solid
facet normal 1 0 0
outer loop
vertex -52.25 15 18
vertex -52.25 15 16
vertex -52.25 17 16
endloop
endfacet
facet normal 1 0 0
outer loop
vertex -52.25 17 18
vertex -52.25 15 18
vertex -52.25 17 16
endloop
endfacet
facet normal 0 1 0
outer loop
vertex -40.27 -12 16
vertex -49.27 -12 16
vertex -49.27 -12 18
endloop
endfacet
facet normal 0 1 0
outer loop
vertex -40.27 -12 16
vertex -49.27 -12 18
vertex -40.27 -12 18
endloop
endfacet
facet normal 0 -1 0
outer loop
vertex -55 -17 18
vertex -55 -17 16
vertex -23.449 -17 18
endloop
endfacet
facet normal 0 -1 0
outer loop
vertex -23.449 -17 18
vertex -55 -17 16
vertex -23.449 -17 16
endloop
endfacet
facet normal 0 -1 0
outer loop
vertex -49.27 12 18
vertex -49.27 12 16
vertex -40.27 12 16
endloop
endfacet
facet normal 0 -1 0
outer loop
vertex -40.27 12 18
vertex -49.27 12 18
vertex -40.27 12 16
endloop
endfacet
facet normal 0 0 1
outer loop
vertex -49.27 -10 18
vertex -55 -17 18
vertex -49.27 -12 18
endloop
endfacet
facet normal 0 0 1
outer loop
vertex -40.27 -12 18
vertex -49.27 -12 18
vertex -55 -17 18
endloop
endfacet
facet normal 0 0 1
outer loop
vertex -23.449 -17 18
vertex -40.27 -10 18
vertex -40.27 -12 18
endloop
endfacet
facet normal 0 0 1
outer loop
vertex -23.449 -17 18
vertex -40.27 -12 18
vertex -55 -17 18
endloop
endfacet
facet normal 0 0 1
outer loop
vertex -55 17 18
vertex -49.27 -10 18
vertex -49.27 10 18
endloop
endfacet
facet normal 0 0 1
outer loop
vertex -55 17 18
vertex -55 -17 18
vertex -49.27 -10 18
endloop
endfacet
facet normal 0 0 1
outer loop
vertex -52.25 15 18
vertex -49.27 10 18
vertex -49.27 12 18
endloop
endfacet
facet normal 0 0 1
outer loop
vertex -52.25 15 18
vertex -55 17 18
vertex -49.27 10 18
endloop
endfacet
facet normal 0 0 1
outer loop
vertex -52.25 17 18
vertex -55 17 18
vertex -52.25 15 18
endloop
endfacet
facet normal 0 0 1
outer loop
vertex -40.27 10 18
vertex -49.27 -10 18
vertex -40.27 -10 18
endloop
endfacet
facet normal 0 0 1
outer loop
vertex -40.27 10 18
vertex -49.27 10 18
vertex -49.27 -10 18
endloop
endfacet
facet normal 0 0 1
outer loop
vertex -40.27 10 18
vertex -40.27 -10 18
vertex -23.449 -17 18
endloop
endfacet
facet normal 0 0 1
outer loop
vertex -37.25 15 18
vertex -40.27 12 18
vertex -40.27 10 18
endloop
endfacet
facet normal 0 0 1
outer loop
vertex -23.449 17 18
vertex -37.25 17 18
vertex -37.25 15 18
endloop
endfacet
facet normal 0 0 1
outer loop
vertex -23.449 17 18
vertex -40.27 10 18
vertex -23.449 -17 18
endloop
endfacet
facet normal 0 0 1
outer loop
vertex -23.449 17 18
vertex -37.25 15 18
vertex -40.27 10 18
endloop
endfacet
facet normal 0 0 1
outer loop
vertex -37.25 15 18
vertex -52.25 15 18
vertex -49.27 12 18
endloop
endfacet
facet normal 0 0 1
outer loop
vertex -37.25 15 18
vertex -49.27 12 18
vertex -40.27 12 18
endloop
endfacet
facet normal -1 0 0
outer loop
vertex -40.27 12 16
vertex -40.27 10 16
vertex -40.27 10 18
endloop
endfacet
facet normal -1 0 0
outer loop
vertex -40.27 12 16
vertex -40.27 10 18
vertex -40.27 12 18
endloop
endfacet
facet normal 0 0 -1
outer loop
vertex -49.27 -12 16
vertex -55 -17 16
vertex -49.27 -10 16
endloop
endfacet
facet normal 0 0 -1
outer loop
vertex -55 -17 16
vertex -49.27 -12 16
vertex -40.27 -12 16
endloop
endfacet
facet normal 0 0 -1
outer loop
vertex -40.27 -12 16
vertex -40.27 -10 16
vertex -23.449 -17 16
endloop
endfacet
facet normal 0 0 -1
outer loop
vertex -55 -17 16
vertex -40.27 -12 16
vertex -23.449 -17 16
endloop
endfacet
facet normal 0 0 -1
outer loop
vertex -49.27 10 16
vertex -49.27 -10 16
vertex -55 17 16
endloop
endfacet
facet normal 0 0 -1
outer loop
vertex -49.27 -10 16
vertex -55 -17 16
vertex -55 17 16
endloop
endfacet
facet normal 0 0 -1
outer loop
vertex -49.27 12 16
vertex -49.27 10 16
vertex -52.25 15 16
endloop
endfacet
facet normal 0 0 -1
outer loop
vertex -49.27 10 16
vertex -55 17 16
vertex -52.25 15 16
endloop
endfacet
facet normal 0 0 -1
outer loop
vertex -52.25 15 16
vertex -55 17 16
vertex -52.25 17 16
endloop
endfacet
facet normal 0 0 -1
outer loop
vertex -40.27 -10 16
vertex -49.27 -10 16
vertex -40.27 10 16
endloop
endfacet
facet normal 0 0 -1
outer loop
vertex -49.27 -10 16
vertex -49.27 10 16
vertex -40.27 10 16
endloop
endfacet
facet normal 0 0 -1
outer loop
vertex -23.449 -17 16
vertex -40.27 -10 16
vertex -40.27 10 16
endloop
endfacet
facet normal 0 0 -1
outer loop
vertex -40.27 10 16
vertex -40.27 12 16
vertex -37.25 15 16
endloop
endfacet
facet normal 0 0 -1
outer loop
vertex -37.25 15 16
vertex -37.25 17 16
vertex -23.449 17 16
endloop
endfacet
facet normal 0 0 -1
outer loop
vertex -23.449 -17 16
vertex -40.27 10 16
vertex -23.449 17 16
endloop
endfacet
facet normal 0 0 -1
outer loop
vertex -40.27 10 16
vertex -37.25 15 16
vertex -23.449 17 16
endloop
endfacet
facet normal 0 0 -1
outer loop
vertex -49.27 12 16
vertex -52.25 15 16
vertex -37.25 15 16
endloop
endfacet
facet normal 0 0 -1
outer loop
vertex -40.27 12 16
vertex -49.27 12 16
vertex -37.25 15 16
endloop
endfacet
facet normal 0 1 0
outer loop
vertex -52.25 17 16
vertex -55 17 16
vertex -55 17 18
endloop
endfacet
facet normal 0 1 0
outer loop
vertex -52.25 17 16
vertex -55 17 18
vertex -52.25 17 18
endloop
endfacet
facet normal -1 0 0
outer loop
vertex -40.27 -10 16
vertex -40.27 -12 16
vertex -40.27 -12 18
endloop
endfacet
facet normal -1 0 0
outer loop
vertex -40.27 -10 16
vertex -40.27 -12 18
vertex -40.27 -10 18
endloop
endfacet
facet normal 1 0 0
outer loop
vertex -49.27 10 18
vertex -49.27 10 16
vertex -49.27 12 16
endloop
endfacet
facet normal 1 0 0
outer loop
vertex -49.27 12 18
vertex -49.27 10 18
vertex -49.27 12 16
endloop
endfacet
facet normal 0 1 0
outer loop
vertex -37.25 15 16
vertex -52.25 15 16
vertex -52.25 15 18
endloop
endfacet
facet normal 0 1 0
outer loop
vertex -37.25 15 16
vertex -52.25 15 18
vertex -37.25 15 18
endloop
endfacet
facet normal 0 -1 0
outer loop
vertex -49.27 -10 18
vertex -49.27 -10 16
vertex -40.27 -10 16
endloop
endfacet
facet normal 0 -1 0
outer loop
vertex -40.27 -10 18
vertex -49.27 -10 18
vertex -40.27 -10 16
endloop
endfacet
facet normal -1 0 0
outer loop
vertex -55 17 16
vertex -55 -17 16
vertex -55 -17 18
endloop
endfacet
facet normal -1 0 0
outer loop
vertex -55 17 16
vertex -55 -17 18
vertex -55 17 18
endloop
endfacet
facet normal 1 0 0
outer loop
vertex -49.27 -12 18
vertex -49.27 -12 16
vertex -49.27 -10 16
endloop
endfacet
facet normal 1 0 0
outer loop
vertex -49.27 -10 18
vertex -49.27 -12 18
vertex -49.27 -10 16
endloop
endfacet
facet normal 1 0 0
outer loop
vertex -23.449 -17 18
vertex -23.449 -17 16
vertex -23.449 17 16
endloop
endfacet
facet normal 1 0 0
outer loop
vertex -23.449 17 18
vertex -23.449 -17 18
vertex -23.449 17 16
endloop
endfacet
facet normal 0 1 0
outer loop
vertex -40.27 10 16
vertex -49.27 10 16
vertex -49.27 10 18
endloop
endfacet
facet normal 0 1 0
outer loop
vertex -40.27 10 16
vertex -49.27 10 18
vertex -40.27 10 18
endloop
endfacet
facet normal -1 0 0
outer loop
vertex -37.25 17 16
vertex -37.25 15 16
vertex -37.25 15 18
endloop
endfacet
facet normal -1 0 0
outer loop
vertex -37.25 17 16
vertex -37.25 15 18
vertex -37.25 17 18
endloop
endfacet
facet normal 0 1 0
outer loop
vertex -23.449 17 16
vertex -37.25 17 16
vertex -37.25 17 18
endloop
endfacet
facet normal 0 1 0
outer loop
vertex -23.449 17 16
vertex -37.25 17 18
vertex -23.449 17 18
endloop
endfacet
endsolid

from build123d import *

# Parameters (mm, degrees)
SKETCH328_W      = 15
SKETCH328_H      = 2
EXTRUDE197_DEPTH = 10
SKETCH327_W      = 9
SKETCH327_H      = 2
EXTRUDE196_DEPTH = 3
SKETCH326_W      = 31.550661
SKETCH326_H      = 34
EXTRUDE195_DEPTH = 2


with BuildPart() as extrude197:
    # Sketch328 → Extrude197 (new body)
    with BuildSketch(Plane(origin=(24.75, 6, 23), x_dir=(1, 0, 0), z_dir=(0, 0, 1))):
        with Locations((-69.5, 10)):
            Rectangle(SKETCH328_W, SKETCH328_H)
    extrude(amount=EXTRUDE197_DEPTH)


with BuildPart() as extrude197_1:
    # Extrude197 placement: moved
    add(extrude197.part.moved(Location((0, 0, -10))))


with BuildPart() as extrude196:
    # Sketch327 → Extrude196 (new body)
    with BuildSketch(Plane(origin=(-0.27, 0, 26), x_dir=(1, 0, 0), z_dir=(0, 0, 1))):
        with Locations((-44.5, 11)):
            Rectangle(SKETCH327_W, SKETCH327_H)
        with Locations((-44.5, -11)):
            Rectangle(SKETCH327_W, SKETCH327_H)
    extrude(amount=EXTRUDE196_DEPTH)


with BuildPart() as speedrig_upper:
    # Sketch326 → Extrude195 (new body)
    with BuildSketch(Plane.XY.offset(26)):
        with Locations((-39.224669, 0)):
            Rectangle(SKETCH326_W, SKETCH326_H)
    extrude(amount=EXTRUDE195_DEPTH)

    # Cut104: cut Extrude196
    add(extrude196.part, mode=Mode.SUBTRACT)


with BuildPart() as speedrig_upper_1:
    # Cut104 placement: moved
    add(speedrig_upper.part.moved(Location((0, 0, -10))))

    # Cut105: cut Extrude197
    add(extrude197_1.part, mode=Mode.SUBTRACT)


solid = speedrig_upper_1.part
